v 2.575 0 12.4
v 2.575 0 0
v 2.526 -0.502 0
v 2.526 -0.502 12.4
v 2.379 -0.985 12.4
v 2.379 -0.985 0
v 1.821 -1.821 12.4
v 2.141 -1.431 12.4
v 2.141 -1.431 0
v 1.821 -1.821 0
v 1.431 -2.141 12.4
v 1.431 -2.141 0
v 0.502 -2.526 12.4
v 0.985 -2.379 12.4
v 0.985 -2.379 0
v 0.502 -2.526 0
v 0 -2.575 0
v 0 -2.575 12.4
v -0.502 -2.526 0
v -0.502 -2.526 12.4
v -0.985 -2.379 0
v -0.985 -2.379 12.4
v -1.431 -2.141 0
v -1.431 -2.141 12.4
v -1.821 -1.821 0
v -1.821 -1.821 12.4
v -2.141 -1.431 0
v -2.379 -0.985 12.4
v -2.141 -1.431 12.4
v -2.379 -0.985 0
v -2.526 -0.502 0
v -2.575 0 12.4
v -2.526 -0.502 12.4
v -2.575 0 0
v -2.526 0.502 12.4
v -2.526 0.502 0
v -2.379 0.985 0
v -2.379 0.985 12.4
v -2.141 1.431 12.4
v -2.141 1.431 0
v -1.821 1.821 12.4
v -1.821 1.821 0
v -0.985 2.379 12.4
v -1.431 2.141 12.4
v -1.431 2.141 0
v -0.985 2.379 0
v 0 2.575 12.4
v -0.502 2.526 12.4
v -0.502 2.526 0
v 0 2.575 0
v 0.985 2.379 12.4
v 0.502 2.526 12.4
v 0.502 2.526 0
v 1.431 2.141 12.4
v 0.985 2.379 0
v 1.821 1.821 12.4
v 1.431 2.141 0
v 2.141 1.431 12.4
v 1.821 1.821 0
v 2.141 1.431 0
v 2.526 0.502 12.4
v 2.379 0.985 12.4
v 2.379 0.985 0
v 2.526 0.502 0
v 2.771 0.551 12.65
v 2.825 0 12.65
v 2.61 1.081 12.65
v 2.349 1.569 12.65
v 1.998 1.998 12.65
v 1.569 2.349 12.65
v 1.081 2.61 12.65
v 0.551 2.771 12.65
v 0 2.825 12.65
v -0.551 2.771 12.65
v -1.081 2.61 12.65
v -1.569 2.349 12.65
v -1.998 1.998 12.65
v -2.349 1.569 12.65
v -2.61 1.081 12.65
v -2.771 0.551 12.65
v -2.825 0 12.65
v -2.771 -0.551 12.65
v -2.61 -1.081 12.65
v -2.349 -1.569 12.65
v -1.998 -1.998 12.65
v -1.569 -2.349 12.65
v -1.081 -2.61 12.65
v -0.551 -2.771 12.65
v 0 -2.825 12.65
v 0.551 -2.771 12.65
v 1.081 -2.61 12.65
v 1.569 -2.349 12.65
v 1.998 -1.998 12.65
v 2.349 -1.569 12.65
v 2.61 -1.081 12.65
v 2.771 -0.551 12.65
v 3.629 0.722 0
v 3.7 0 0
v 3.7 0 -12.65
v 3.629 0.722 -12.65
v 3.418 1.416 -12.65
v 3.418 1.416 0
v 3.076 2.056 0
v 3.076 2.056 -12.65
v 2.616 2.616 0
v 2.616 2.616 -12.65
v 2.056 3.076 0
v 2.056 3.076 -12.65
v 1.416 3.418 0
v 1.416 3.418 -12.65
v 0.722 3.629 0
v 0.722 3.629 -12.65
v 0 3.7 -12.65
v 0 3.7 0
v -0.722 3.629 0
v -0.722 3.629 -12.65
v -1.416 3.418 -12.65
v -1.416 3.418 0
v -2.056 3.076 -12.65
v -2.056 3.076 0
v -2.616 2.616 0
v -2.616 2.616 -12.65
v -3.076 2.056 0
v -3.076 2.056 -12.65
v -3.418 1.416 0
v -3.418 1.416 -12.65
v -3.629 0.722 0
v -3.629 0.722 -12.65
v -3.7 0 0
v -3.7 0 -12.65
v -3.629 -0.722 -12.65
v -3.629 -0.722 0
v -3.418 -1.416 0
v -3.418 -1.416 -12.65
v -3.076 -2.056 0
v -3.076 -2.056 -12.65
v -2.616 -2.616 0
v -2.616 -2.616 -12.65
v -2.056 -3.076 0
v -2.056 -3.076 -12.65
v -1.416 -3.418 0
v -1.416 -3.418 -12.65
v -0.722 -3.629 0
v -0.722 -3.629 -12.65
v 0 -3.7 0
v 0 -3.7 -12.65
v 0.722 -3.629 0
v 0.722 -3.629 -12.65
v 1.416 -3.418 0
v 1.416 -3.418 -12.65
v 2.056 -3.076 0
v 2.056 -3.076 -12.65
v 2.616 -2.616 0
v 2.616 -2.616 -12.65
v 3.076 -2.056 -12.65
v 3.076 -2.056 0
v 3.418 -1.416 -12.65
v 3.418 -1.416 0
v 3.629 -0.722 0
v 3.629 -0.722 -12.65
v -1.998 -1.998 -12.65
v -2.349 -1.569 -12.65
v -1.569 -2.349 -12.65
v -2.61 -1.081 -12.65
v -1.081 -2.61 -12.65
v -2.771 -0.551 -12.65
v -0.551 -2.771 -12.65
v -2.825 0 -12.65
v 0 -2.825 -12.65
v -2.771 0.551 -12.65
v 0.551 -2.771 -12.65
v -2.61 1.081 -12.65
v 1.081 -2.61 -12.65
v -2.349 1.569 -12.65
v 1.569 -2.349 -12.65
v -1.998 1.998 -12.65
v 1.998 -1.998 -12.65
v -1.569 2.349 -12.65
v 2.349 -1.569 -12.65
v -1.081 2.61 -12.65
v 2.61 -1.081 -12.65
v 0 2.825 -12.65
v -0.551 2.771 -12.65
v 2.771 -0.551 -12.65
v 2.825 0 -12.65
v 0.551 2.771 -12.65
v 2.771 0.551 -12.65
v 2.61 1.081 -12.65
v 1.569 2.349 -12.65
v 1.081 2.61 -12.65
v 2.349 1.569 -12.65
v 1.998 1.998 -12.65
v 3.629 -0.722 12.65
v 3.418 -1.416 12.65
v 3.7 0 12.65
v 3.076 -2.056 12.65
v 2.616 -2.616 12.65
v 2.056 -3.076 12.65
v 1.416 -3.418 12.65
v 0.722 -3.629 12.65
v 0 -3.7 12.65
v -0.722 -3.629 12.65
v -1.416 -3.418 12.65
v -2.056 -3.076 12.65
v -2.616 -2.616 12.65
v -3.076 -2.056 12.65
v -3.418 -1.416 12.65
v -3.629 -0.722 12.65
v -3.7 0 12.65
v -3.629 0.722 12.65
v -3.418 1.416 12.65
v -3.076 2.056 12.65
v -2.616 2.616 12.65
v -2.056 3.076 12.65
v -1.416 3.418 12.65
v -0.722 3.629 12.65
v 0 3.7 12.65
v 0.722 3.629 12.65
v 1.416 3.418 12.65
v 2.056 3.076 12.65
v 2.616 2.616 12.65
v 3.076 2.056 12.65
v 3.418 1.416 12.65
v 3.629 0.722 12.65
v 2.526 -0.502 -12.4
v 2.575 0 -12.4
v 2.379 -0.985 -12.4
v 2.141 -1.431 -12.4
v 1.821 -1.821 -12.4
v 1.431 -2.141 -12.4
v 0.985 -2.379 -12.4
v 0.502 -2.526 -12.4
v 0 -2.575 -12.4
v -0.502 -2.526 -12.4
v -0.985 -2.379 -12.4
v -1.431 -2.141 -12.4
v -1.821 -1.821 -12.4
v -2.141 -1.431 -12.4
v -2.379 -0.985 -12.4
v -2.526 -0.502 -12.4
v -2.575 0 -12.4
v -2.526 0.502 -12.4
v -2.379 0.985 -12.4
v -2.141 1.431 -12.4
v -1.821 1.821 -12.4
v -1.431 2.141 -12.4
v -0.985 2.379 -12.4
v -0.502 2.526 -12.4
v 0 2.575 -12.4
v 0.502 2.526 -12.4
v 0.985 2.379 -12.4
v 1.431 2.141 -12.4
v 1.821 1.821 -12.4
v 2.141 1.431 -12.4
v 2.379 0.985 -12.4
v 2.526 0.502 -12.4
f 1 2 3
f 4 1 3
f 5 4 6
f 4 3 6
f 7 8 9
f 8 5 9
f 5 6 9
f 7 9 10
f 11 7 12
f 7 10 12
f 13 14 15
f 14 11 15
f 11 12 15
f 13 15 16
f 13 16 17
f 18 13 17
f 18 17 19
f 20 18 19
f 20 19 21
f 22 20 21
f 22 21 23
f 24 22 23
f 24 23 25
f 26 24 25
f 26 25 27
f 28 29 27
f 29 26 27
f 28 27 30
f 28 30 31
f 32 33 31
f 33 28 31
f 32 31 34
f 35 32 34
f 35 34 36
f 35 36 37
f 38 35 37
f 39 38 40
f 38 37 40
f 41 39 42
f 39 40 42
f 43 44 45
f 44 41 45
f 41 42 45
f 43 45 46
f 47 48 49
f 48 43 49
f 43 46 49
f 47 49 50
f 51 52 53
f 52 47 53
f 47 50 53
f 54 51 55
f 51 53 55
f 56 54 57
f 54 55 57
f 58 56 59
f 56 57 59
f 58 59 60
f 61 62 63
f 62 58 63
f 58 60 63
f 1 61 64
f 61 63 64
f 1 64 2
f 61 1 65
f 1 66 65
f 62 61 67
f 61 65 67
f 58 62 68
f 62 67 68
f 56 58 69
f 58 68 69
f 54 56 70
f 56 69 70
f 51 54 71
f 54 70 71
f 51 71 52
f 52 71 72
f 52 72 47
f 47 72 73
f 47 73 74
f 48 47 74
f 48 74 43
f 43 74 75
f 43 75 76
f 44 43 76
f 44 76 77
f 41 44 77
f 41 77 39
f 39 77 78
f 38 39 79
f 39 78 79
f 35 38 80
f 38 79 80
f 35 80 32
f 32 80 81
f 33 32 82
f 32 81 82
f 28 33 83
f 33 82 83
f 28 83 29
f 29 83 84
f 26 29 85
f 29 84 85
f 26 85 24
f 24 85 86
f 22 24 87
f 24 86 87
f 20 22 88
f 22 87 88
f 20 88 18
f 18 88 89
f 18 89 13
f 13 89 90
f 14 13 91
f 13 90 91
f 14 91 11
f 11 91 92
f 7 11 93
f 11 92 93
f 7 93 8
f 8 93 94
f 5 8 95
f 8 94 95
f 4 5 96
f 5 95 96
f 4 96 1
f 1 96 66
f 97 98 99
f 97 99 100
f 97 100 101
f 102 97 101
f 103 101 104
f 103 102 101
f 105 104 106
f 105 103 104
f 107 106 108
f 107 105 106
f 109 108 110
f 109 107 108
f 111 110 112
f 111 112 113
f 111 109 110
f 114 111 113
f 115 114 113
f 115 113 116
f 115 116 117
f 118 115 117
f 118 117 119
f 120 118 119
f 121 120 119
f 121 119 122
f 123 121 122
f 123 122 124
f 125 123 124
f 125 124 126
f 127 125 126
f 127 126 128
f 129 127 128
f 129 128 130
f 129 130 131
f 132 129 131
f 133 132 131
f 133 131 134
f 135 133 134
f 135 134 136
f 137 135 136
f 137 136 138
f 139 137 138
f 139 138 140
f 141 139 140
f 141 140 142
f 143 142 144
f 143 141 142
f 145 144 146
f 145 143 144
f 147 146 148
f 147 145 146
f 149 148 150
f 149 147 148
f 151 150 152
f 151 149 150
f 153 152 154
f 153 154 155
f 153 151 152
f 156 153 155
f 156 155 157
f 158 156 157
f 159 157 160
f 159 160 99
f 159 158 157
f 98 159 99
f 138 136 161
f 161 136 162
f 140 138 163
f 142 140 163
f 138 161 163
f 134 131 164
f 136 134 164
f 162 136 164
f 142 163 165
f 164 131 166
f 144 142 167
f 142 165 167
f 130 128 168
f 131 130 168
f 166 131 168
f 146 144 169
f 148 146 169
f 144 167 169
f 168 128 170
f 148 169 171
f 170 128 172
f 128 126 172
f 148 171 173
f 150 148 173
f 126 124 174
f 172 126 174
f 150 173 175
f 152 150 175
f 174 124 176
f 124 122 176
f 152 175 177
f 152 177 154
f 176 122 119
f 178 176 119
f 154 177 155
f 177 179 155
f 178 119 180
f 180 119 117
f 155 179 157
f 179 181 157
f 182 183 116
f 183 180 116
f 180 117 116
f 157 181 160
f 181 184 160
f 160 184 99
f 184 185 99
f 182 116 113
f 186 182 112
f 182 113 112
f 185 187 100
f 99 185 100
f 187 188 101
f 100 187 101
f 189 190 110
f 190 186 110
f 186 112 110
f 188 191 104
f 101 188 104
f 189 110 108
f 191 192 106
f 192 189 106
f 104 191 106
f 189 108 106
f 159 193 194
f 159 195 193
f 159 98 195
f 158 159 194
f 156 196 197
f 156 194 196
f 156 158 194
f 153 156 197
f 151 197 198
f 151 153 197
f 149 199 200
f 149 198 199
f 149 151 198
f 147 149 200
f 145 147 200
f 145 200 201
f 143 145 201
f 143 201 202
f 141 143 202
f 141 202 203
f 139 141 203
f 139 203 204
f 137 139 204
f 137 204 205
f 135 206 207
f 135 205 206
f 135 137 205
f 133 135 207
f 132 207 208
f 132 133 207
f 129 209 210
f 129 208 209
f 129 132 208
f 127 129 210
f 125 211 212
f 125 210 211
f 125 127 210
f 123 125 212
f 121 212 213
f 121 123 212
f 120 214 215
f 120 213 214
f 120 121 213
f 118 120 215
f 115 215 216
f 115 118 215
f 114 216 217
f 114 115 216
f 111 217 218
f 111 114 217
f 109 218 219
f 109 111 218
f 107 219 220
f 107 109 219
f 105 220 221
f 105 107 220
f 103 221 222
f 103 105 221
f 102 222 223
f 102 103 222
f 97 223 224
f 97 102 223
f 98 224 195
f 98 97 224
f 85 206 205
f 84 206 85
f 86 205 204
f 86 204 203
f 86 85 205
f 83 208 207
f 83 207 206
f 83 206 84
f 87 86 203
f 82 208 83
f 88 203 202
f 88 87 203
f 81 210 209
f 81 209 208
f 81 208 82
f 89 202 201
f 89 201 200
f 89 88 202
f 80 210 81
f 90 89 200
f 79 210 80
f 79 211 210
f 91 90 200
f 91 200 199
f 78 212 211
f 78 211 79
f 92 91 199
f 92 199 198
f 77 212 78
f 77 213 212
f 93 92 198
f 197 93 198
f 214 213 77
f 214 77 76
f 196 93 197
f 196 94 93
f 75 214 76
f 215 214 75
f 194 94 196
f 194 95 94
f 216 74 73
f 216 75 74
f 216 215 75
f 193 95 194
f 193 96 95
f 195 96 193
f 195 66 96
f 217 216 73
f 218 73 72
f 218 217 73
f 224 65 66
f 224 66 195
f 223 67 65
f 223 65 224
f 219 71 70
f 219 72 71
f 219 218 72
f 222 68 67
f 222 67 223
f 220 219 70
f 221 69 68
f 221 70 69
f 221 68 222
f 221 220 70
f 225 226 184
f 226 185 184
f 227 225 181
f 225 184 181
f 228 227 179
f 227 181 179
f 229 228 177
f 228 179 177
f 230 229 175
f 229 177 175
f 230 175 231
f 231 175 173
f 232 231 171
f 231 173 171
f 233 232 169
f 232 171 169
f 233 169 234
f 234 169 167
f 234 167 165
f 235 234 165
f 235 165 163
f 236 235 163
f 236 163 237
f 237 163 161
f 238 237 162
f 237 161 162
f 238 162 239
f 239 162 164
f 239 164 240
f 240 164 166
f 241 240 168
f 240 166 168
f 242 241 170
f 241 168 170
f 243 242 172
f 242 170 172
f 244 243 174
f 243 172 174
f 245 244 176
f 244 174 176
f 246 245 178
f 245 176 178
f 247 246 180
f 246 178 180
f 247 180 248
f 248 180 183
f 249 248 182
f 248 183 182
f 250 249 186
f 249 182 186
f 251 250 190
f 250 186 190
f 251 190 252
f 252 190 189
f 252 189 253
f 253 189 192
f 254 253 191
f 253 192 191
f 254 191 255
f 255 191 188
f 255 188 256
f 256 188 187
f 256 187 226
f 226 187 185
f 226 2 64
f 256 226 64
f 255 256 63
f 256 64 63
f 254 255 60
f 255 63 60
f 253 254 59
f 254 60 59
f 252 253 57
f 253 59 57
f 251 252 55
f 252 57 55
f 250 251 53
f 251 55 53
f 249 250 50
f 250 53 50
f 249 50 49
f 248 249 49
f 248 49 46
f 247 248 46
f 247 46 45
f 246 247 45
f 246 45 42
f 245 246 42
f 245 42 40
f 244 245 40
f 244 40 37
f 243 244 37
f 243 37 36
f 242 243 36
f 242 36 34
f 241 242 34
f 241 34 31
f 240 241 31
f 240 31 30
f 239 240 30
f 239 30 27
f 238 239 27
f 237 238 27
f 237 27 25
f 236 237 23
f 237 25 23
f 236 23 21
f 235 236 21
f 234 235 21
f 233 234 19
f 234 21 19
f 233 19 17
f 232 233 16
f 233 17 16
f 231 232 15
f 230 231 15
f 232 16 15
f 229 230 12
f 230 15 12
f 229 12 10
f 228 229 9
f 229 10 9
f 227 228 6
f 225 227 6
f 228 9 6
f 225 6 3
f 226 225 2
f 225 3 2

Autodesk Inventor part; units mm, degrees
ref_plane "YZ Plane" through (0, 0, 0) normal (1, 0, 0) x (0, 1, 0)
ref_plane "XZ Plane" through (0, 0, 0) normal (0, 1, 0) x (-1, 0, 0)
ref_plane "XY Plane" through (0, 0, 0) normal (0, 0, 1) x (1, 0, 0)
sketch "Szkic1" plane through (0, 0, 0) normal (0, 0, 1) x (1, 0, 0)
  circle A0 centre (0, 0) radius 3.7
  circle A1 centre (0, 0) radius 2.575
  dimension "d0" = 7.4
  dimension "d1" = 5.15
extrude "Wyciągnięcie proste1" add sketch "Szkic1" along normal mid plane 25.3
chamfer "Faza1" distance 0.25 angle 45 2 edges at (-2.575, 0, 12.65) (-2.575, 0, -12.65)
properties part number "TULEJKA" material "Stal nierdzewna"
